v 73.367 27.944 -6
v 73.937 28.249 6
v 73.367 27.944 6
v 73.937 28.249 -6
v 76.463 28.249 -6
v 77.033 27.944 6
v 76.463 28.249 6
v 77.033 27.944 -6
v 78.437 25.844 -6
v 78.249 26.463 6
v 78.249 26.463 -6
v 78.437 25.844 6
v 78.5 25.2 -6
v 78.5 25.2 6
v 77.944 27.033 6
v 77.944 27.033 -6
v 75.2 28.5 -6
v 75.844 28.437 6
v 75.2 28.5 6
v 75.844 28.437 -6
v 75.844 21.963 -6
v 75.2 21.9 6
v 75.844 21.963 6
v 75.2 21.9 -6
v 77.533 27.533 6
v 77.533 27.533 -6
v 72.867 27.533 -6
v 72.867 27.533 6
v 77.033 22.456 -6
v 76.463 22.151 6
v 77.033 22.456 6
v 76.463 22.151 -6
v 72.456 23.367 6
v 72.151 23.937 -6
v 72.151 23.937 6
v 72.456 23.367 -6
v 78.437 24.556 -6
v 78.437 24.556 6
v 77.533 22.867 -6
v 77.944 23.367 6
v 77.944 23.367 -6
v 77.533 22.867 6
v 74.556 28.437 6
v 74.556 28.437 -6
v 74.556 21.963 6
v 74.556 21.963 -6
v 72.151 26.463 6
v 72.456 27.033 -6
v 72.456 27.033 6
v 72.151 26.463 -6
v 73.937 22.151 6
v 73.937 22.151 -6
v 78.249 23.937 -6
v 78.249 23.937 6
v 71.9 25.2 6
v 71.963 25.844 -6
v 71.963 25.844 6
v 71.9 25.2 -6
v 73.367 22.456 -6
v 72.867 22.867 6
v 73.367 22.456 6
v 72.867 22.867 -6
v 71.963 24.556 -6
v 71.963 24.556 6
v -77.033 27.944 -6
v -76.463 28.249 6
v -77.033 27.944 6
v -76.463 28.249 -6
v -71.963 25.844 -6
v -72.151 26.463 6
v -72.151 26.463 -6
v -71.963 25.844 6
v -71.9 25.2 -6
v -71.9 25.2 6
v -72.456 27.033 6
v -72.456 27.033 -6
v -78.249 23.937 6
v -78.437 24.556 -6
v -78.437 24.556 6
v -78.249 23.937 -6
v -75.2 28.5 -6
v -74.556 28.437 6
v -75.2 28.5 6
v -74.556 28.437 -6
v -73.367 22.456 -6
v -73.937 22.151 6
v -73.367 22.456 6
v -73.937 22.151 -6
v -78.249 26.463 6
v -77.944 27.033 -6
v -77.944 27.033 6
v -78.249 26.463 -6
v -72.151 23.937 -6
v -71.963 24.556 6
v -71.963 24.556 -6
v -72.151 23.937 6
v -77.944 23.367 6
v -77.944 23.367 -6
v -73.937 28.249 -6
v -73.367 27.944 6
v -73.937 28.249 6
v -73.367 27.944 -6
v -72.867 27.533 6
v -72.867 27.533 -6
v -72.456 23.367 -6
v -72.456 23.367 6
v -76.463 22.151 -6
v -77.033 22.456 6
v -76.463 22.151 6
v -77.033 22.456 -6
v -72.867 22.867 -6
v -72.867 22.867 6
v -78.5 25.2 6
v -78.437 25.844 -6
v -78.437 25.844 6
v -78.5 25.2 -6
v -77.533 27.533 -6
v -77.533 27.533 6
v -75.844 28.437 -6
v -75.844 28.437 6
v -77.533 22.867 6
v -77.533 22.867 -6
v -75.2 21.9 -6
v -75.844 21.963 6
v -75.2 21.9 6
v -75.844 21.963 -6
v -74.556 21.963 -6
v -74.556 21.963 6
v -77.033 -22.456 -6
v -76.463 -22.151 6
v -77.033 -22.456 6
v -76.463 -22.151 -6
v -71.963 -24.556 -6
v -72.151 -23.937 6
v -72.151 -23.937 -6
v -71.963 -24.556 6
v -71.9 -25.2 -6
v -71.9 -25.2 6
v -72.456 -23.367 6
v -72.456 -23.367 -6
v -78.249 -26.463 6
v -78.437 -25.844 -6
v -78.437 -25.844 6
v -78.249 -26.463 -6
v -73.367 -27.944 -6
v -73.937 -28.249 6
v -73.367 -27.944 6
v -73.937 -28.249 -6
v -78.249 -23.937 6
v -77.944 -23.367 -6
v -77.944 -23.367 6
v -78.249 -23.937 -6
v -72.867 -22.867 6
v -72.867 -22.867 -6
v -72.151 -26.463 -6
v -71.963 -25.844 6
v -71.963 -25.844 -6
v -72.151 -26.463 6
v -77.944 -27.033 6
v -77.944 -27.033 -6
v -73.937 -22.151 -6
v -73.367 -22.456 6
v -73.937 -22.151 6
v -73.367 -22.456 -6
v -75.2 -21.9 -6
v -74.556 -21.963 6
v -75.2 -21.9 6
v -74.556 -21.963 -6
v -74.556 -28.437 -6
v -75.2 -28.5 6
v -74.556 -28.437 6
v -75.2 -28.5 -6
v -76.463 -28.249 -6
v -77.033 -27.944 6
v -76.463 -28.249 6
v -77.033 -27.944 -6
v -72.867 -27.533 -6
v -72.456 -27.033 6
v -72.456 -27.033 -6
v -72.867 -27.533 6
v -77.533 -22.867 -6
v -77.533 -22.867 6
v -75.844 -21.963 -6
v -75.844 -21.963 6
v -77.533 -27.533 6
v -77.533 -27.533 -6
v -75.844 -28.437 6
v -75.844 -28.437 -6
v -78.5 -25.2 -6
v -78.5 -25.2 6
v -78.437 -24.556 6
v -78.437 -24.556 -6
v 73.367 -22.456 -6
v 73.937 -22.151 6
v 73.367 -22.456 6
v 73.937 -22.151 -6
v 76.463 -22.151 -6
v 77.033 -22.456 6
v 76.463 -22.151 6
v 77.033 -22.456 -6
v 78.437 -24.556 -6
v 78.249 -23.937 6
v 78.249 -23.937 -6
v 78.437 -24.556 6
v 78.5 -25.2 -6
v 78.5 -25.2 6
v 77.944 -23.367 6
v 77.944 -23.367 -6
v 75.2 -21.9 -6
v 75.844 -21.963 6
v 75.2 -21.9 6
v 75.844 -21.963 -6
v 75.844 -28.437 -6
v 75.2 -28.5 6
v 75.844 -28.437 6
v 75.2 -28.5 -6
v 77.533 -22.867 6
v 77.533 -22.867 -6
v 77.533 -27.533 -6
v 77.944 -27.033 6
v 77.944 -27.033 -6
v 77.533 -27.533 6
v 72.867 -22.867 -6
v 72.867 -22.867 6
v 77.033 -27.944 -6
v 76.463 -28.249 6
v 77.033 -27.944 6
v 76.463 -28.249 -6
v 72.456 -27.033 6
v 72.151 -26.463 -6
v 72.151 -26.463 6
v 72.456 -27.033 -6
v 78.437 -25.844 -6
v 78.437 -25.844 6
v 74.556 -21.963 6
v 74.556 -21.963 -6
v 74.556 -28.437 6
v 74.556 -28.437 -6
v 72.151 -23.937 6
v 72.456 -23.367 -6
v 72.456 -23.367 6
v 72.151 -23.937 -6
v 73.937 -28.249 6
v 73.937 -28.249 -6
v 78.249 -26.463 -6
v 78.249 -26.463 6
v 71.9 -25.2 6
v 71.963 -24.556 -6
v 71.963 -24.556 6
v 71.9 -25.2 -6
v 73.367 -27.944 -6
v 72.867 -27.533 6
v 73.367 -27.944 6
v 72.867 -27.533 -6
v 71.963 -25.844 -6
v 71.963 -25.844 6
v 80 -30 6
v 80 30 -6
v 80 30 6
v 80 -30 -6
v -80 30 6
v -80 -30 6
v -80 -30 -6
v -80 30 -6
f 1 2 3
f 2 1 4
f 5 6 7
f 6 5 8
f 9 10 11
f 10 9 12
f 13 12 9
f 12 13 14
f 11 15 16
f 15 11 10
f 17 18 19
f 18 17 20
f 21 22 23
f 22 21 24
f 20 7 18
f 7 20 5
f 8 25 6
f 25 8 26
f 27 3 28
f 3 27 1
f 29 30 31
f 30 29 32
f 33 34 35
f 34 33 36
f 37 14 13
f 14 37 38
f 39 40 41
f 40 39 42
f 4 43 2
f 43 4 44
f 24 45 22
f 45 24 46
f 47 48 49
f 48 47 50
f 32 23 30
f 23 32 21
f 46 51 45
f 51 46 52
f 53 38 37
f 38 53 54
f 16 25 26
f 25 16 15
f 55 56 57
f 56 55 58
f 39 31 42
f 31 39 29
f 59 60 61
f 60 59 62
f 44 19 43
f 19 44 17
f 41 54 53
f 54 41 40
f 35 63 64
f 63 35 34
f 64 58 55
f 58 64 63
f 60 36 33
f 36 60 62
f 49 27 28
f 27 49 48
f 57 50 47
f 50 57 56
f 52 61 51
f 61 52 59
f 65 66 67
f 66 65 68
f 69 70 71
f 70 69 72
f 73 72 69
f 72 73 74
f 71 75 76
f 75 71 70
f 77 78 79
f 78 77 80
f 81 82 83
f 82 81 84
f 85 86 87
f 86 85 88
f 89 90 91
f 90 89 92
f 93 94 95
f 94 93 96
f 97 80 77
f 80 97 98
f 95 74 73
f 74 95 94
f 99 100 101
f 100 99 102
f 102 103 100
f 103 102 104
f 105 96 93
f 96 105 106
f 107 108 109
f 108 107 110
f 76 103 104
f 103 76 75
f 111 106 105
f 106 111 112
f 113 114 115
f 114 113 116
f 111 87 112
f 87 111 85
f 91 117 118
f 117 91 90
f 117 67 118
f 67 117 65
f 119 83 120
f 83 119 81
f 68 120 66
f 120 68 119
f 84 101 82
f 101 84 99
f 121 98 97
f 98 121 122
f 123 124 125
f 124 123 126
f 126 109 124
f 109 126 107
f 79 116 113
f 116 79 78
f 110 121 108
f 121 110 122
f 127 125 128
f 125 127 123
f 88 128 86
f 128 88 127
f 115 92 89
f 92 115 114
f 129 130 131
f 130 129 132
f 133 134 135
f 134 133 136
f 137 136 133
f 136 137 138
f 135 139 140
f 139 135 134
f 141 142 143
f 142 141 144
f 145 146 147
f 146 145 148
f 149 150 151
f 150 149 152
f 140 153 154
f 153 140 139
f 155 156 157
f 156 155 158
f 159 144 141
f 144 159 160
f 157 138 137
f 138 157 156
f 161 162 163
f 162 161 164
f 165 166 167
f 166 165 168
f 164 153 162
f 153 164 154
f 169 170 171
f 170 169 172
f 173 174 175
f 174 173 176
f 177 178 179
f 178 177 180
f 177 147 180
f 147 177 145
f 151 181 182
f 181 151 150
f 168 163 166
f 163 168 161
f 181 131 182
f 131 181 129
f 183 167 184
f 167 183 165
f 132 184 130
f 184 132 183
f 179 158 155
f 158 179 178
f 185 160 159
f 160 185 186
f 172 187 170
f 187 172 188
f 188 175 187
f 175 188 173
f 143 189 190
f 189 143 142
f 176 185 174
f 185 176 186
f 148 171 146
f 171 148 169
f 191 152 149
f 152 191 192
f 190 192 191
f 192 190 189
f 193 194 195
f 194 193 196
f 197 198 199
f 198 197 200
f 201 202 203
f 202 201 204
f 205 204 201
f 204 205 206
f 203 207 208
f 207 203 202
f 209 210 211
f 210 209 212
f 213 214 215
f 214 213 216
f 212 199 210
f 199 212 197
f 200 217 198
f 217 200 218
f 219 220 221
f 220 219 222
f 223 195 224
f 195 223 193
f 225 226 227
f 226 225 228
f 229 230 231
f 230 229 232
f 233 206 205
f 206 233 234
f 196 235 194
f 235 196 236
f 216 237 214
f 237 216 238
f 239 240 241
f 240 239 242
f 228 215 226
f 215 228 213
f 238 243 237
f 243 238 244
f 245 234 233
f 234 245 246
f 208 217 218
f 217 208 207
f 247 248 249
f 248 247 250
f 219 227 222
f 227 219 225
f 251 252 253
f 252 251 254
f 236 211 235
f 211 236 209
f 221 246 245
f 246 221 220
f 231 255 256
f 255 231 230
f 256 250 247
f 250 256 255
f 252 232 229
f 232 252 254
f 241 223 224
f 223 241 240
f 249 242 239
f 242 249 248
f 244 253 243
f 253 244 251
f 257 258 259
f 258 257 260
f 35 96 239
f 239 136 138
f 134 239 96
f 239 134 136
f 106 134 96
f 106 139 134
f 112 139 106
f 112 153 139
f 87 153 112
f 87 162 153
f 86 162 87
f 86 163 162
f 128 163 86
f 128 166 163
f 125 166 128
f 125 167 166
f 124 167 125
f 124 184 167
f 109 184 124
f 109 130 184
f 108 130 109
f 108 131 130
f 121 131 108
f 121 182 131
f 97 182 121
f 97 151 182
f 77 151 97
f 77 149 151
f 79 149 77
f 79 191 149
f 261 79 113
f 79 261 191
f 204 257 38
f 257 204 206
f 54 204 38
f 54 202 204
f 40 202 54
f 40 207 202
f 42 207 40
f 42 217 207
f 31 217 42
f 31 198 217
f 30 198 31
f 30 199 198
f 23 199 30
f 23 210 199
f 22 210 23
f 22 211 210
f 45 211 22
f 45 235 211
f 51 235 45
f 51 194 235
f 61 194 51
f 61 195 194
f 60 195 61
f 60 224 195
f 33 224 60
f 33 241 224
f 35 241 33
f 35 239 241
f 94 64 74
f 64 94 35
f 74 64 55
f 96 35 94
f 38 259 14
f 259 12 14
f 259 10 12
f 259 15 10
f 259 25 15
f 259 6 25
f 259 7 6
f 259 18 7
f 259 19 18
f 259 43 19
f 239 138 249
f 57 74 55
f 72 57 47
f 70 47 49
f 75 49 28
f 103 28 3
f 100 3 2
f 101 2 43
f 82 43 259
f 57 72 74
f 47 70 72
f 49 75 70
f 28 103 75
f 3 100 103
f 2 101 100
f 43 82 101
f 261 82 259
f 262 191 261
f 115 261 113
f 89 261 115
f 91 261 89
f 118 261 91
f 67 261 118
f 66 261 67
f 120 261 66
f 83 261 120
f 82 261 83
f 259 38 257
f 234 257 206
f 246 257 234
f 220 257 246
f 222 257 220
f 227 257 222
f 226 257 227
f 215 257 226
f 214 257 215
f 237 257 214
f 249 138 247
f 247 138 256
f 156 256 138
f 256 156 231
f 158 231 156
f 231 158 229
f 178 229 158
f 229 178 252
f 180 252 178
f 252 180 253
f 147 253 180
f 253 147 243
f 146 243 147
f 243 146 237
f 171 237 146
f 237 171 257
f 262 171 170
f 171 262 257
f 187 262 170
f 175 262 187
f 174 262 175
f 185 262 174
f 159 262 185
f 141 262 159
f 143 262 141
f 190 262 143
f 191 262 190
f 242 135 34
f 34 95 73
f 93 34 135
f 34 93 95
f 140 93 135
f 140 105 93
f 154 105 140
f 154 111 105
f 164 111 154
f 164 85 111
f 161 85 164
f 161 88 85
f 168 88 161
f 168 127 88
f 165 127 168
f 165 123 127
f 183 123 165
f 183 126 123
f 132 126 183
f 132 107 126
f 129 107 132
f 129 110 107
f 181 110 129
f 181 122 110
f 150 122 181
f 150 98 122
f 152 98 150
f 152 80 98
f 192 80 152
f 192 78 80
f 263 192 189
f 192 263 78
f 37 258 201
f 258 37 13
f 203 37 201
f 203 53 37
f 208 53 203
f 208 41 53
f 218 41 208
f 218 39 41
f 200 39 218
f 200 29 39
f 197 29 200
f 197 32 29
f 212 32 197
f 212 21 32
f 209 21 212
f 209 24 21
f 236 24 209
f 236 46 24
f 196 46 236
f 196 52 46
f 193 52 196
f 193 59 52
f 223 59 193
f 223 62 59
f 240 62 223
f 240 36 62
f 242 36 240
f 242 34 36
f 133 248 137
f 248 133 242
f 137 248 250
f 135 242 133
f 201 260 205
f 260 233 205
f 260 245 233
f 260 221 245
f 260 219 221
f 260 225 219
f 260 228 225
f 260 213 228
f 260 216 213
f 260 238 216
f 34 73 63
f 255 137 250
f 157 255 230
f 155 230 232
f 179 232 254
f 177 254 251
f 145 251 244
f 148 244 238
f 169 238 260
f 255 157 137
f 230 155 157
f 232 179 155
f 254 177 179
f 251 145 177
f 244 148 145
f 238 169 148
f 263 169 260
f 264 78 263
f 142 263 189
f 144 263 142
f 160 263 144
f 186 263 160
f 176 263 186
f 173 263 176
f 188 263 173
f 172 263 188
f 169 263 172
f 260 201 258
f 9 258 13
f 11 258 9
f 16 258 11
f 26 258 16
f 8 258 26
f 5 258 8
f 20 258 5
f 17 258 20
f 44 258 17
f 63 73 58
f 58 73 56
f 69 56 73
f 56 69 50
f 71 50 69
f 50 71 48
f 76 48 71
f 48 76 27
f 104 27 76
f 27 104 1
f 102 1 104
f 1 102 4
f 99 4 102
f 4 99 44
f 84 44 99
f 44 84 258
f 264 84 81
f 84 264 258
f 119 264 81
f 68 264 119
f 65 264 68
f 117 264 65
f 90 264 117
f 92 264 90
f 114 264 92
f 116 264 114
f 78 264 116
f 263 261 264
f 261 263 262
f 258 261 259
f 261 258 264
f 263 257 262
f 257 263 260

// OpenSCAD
$fn = 32;

// ----------------------------------------------------------------------
// Corner plate 160 x 60 x 12
// 4 holes, centres taken from the edge offset
// ----------------------------------------------------------------------

// --- parameters (mm) ---
plate = [160, 60, 12];  // overall size (x, y, z)
holes = 4;              // number of holes the drawing asks for
hole_d = 6.6;           // hole diameter
edge = 4.8;             // hole centre offset from the plate edge

// --- derived feature positions (mm) ---
corner_x = plate[0] / 2 - edge;  // = 75.2   corner hole X
corner_y = plate[1] / 2 - edge;  // = 25.2   corner hole Y
feature_centers = [
  [corner_x, corner_y],
  [-corner_x, corner_y],
  [-corner_x, -corner_y],
  [corner_x, -corner_y]
];   // hole centres the loop below drills

// plate outline, every hole drilled through with the same cutters
difference() {
  cube(plate, center = true);
  for (centre = feature_centers)
    translate([centre[0], centre[1], 0])
      cylinder(d = hole_d, h = plate[2] + 2, center = true);
}
